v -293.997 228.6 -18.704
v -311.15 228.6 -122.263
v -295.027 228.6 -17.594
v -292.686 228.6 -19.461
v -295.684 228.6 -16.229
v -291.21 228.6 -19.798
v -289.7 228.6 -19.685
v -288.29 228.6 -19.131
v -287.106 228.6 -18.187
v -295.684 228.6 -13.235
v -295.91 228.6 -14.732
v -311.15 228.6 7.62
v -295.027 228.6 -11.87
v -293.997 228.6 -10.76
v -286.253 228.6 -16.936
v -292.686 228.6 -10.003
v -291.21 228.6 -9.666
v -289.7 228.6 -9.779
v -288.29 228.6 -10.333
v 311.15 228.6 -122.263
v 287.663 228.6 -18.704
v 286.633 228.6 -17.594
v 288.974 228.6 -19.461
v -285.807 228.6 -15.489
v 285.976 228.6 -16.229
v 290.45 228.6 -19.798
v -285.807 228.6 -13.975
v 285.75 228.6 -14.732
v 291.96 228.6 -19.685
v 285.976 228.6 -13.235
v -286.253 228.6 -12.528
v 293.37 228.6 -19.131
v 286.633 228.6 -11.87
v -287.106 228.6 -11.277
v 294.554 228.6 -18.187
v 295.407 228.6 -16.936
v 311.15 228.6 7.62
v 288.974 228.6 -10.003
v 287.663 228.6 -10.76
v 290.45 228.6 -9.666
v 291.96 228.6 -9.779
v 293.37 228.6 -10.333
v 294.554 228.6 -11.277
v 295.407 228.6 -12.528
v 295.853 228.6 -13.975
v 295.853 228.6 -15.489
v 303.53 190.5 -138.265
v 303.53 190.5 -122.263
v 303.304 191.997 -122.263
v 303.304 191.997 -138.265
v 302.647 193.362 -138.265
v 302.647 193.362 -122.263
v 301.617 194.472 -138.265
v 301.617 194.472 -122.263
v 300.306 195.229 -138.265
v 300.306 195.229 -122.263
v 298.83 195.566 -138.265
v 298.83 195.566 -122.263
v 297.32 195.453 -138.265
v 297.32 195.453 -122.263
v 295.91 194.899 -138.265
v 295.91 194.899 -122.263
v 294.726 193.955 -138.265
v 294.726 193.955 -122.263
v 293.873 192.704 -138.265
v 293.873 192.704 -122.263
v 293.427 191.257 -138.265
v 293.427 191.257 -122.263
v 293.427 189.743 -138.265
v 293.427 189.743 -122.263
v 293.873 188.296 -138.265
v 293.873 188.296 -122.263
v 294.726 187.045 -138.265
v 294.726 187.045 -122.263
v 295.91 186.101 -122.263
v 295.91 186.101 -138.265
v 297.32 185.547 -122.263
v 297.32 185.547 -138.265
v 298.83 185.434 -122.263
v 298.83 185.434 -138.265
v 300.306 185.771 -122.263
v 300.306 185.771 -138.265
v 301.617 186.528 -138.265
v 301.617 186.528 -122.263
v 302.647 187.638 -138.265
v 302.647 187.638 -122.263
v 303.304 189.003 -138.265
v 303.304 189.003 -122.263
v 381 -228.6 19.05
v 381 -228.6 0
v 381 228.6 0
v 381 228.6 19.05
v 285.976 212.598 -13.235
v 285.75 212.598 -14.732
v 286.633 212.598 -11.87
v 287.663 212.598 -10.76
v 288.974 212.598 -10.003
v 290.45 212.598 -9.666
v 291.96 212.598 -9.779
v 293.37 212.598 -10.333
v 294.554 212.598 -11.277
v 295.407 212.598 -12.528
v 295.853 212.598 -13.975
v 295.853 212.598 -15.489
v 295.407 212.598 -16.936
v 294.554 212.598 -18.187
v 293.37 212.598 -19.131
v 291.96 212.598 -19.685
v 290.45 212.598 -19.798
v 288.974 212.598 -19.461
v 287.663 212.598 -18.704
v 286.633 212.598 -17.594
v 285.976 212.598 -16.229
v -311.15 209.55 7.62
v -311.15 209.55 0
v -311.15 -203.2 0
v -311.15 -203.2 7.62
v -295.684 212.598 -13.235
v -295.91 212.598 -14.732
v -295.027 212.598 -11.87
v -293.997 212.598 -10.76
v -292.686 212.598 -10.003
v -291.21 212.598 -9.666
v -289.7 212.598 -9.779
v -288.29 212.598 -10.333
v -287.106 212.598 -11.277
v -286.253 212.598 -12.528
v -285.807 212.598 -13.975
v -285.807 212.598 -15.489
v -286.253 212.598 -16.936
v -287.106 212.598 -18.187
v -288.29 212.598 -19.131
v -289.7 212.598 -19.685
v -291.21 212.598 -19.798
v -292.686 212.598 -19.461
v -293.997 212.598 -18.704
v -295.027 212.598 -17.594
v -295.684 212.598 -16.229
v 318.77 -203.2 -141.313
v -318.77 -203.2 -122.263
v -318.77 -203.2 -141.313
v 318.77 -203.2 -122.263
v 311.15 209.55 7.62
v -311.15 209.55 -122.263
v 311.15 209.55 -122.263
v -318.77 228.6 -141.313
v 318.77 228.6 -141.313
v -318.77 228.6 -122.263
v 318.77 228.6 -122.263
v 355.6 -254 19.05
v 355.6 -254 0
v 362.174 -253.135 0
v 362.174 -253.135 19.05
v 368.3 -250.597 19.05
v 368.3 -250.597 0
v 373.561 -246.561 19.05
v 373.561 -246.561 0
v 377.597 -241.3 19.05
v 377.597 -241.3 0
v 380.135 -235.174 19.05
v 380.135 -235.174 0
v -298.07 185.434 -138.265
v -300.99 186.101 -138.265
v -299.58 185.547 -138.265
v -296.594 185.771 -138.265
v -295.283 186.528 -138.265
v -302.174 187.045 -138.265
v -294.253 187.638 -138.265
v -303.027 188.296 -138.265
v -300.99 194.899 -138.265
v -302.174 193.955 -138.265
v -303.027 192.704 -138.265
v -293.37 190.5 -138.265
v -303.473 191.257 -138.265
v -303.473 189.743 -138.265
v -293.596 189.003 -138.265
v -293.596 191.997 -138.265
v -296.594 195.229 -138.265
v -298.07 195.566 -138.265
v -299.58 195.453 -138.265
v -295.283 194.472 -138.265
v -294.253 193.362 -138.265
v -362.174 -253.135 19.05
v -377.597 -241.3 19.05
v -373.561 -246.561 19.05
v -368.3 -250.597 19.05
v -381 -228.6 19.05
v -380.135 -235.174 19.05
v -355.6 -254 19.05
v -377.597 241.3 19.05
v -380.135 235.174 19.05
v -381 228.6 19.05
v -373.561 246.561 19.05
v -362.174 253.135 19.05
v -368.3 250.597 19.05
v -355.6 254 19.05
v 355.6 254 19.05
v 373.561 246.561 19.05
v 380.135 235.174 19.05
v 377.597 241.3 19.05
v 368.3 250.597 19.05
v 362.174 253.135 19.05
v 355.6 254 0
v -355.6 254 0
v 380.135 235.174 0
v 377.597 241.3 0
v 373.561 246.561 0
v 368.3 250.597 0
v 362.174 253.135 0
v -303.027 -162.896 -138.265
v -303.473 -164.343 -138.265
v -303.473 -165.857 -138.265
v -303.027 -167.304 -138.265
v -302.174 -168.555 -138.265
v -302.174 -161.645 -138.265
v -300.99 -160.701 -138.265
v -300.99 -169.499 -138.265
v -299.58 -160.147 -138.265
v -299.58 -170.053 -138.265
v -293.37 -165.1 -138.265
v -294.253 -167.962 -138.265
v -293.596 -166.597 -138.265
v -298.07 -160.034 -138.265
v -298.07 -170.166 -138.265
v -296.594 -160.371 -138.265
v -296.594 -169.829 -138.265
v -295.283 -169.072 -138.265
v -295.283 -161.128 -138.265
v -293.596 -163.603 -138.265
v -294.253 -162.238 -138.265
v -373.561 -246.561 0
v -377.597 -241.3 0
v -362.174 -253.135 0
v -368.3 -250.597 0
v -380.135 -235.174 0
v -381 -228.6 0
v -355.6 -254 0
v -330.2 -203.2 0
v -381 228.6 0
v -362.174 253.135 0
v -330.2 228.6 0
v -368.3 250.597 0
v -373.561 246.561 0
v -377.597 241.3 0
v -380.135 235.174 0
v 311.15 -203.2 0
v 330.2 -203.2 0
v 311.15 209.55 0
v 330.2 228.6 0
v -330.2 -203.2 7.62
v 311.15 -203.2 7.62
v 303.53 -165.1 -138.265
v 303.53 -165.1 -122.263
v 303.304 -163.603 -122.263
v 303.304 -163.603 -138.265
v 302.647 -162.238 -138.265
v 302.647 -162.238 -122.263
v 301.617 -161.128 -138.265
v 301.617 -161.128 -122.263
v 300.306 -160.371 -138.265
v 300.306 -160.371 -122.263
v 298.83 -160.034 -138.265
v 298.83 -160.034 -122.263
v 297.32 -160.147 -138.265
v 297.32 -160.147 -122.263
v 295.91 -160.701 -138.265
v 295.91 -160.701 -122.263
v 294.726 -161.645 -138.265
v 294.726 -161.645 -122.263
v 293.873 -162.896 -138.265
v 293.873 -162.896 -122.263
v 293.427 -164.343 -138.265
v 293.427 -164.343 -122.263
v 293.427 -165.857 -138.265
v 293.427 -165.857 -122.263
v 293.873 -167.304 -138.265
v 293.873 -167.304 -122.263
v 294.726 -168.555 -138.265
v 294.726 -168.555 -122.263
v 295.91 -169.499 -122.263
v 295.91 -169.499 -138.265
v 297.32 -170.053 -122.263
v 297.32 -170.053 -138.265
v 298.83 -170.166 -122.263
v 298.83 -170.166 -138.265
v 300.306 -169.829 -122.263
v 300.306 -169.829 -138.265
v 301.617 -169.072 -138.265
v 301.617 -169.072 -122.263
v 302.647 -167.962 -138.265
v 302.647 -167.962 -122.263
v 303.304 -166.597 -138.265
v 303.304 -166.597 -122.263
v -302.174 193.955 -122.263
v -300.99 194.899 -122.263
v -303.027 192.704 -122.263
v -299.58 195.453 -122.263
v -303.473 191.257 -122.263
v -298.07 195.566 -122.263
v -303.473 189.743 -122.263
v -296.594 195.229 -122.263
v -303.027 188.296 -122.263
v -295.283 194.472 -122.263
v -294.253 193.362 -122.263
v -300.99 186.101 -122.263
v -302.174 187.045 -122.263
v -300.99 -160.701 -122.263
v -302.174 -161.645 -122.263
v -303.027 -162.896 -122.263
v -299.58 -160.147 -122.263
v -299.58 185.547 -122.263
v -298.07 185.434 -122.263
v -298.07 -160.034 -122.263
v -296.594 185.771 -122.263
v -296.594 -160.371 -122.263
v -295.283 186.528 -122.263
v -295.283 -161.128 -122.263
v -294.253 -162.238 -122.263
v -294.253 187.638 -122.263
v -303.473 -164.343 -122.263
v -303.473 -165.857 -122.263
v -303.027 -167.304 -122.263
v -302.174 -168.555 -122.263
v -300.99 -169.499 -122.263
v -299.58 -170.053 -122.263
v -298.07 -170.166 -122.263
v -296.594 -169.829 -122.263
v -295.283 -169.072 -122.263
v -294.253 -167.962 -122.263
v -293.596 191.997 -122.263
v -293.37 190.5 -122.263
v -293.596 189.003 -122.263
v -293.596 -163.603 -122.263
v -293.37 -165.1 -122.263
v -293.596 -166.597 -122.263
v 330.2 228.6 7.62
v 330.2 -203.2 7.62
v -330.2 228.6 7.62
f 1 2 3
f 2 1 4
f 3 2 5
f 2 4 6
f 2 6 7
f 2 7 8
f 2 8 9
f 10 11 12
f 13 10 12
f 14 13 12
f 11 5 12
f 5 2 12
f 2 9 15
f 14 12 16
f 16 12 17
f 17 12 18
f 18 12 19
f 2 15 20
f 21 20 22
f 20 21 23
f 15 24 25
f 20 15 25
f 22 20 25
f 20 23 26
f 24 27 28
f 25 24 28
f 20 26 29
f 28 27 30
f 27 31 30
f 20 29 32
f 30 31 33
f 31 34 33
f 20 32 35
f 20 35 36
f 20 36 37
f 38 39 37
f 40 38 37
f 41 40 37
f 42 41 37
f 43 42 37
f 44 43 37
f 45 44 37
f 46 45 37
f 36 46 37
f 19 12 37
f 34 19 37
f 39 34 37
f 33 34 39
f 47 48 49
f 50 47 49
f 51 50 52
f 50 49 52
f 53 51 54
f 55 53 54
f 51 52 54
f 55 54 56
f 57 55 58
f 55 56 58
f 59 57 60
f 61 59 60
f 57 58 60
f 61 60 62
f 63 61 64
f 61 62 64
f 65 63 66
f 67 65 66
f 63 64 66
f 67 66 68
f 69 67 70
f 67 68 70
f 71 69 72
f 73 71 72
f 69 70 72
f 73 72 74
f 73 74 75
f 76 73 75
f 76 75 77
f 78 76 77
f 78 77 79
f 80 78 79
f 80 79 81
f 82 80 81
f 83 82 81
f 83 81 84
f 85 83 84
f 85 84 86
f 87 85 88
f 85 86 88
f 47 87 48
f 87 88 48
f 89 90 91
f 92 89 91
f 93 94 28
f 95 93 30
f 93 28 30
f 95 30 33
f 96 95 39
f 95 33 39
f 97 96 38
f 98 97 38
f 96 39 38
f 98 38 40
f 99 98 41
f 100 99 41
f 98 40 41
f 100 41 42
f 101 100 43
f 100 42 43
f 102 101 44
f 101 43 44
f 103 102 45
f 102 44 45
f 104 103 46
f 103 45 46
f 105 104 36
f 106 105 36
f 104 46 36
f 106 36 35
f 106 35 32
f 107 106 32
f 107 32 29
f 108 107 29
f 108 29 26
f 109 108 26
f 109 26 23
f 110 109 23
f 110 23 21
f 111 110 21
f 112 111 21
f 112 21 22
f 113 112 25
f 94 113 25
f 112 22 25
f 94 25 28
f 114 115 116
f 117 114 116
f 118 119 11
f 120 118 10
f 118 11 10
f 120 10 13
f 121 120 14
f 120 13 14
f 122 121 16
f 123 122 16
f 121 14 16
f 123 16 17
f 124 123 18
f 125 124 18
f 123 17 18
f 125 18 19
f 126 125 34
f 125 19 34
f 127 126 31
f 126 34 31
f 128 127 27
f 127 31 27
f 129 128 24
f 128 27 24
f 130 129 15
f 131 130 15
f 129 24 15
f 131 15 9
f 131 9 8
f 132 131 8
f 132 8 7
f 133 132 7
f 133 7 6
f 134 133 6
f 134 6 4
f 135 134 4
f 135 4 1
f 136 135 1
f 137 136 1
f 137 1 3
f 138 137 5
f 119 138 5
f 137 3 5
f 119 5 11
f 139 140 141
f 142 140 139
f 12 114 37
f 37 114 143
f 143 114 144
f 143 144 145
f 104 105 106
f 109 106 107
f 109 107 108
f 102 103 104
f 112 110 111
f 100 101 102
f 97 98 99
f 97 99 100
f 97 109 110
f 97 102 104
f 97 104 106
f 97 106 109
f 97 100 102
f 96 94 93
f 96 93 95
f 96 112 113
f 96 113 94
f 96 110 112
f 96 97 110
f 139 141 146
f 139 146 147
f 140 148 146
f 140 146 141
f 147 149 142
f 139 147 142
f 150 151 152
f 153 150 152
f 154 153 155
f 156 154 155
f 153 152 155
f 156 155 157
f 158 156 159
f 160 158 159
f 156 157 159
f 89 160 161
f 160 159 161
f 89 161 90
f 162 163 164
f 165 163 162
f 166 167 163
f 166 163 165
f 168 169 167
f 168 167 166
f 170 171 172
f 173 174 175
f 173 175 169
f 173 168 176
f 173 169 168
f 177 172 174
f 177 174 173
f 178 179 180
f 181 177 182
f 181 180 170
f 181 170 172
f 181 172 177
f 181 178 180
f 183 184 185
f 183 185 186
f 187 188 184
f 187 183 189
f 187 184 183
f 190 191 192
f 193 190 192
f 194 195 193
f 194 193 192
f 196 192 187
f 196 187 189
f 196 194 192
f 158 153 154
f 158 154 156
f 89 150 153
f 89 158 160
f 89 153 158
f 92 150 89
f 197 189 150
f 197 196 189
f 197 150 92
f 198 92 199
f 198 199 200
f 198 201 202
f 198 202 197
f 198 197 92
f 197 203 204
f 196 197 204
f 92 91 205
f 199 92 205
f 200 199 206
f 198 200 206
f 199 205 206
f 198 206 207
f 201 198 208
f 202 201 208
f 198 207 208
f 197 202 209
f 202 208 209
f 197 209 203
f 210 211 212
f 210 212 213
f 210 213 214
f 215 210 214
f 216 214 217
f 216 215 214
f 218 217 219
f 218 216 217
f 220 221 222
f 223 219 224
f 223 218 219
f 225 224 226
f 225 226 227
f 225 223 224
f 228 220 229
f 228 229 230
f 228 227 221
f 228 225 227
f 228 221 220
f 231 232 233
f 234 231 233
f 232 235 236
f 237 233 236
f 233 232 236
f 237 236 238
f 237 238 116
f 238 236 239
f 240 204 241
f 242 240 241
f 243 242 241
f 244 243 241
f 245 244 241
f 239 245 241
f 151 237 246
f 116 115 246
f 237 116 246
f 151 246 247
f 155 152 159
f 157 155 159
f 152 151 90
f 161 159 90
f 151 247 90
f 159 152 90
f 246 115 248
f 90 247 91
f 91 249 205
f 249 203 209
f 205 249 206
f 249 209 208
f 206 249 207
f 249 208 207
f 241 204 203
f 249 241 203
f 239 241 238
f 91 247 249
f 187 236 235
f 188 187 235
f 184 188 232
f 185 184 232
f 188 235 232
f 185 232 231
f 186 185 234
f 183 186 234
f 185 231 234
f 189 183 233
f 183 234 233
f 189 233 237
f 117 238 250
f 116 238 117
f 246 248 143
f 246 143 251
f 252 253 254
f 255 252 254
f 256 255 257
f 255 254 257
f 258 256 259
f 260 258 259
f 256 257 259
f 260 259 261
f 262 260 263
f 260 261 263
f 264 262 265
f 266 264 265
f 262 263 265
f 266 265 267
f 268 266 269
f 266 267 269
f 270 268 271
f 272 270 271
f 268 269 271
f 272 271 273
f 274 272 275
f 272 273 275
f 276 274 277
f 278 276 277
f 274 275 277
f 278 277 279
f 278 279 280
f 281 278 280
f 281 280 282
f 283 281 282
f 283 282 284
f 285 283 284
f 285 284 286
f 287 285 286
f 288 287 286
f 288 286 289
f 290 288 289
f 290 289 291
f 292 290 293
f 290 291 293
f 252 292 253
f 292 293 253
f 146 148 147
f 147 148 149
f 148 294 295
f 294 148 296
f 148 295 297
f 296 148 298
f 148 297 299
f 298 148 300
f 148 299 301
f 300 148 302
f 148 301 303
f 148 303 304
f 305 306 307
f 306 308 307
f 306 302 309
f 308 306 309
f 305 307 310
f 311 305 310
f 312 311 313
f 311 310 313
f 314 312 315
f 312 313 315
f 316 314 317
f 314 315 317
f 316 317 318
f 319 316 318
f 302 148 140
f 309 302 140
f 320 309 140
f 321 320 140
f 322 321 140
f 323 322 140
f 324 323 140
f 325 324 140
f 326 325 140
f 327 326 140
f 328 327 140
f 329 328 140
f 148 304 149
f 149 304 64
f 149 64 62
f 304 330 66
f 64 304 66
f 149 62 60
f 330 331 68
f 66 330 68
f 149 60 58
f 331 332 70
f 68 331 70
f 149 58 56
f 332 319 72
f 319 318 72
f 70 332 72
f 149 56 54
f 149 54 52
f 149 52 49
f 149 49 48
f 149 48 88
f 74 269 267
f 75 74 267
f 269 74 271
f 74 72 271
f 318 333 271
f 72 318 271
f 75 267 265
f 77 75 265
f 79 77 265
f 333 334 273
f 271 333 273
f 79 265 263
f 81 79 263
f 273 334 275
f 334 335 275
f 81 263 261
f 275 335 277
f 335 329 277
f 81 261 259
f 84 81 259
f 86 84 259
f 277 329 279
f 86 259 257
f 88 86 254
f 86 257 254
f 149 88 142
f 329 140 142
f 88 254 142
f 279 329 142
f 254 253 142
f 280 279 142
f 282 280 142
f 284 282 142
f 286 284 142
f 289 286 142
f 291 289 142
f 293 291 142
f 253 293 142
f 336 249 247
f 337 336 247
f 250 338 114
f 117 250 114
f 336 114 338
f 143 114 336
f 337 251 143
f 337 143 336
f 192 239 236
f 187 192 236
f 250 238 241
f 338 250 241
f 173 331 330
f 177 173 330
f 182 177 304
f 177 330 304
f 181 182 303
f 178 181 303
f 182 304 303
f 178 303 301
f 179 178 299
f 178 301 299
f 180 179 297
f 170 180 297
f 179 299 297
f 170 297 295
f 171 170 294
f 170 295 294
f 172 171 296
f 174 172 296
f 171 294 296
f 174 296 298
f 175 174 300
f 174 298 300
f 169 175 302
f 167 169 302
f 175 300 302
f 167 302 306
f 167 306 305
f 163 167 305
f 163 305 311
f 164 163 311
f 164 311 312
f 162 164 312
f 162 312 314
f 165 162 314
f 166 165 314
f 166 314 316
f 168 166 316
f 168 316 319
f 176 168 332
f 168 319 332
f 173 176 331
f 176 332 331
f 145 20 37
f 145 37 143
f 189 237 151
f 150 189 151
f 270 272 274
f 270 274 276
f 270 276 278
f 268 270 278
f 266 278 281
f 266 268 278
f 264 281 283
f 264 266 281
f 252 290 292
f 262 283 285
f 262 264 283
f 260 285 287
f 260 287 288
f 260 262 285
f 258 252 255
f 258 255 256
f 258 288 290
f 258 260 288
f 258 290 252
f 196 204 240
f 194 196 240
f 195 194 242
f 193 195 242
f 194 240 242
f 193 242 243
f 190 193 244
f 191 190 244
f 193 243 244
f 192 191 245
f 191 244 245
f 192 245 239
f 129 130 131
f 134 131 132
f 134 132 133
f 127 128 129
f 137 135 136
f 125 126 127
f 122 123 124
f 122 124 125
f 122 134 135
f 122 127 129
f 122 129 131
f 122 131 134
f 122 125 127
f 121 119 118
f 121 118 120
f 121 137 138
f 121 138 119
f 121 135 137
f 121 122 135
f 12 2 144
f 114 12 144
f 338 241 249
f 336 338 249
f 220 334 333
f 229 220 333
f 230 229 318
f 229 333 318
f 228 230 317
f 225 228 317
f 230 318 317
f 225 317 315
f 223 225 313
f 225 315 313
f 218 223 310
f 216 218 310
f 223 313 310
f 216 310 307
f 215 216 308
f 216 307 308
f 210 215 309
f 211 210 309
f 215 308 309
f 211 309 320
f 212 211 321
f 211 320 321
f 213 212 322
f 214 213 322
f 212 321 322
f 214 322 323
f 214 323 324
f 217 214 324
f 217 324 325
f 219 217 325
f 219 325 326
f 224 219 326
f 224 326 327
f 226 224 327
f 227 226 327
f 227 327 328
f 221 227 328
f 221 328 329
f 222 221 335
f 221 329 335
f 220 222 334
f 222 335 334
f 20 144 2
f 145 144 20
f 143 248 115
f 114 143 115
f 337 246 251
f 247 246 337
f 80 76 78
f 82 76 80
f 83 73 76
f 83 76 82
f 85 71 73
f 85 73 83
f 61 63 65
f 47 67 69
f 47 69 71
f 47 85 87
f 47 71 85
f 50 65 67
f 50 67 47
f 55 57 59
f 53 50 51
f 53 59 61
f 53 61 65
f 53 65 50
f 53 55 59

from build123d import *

# Parameters (mm, degrees)
F1_DEPTH  = 19.05
F2_W      = 19.05
F2_H      = 412.75
F3_DEPTH  = 7.62
F4_W      = 622.3
F4_H      = 19.05
F5_DEPTH  = 129.8829
F6_W      = 637.54
F6_H      = 431.8
F7_DEPTH  = 19.05
F8_R      = 5.08
F9_DEPTH  = 16.002
F10_R     = 5.08
F11_DEPTH = 16.002


with BuildPart() as f1:
    # F0 (on Top) → F1 (new body)
    with BuildSketch(Plane.XY):
        with BuildLine():
            Line((355.6, 254), (-355.6, 254))
            ThreePointArc((-355.6, 254), (-373.560512, 246.560512), (-381, 228.6))
            Line((-381, 228.6), (-381, -228.6))
            ThreePointArc((-381, -228.6), (-373.560512, -246.560512), (-355.6, -254))
            Line((-355.6, -254), (355.6, -254))
            ThreePointArc((355.6, -254), (373.560512, -246.560512), (381, -228.6))
            Line((381, -228.6), (381, 228.6))
            ThreePointArc((381, 228.6), (373.560512, 246.560512), (355.6, 254))
        make_face()
    extrude(amount=F1_DEPTH)

    # F2 (on face) → F3 (cut)
    with BuildSketch(Plane(origin=(0, 0, 0), x_dir=(1, 0, 0), z_dir=(0, 0, -1))):
        Polygon((-330.2, -228.6), (330.2, -228.6), (330.2, -209.55), (311.15, -209.55), (-311.15, -209.55), (-330.2, -209.55), align=None)
        with Locations((320.675, -3.175)):
            Rectangle(F2_W, F2_H)
        with Locations((-320.675, -3.175)):
            Rectangle(F2_W, F2_H)
    extrude(amount=-F3_DEPTH, mode=Mode.SUBTRACT)


with BuildPart() as f5:
    # F4 (on face) → F5 (new body)
    with BuildSketch(Plane(origin=(0, 0, 7.62), x_dir=(1, 0, 0), z_dir=(0, 0, -1))):
        with Locations((0, -219.075)):
            Rectangle(F4_W, F4_H)
    extrude(amount=F5_DEPTH)

    # F8 (on face) → F9 (cut)
    with BuildSketch(Plane(origin=(0, 228.6, 0), x_dir=(-1, 0, 0), z_dir=(0, 1, 0))):
        with Locations((-290.83, -14.732)):
            Circle(F8_R)
        with Locations((290.83, -14.732)):
            Circle(F8_R)
    extrude(amount=-F9_DEPTH, mode=Mode.SUBTRACT)


with BuildPart() as f7:
    # F6 (on face) → F7 (new body)
    with BuildSketch(Plane(origin=(0, 0, -122.2629), x_dir=(1, 0, 0), z_dir=(0, 0, -1))):
        with Locations((0, -12.7)):
            Rectangle(F6_W, F6_H)
    extrude(amount=F7_DEPTH)

    # F10 (on face) → F11 (cut)
    with BuildSketch(Plane.XY.offset(-122.2629)):
        with Locations((-298.45, 190.5)):
            Circle(F10_R)
        with Locations((298.45, 190.5)):
            Circle(F10_R)
        with Locations((298.45, -165.1)):
            Circle(F10_R)
        with Locations((-298.45, -165.1)):
            Circle(F10_R)
    extrude(amount=-F11_DEPTH, mode=Mode.SUBTRACT)


solid = Compound([f1.part, f5.part, f7.part])
